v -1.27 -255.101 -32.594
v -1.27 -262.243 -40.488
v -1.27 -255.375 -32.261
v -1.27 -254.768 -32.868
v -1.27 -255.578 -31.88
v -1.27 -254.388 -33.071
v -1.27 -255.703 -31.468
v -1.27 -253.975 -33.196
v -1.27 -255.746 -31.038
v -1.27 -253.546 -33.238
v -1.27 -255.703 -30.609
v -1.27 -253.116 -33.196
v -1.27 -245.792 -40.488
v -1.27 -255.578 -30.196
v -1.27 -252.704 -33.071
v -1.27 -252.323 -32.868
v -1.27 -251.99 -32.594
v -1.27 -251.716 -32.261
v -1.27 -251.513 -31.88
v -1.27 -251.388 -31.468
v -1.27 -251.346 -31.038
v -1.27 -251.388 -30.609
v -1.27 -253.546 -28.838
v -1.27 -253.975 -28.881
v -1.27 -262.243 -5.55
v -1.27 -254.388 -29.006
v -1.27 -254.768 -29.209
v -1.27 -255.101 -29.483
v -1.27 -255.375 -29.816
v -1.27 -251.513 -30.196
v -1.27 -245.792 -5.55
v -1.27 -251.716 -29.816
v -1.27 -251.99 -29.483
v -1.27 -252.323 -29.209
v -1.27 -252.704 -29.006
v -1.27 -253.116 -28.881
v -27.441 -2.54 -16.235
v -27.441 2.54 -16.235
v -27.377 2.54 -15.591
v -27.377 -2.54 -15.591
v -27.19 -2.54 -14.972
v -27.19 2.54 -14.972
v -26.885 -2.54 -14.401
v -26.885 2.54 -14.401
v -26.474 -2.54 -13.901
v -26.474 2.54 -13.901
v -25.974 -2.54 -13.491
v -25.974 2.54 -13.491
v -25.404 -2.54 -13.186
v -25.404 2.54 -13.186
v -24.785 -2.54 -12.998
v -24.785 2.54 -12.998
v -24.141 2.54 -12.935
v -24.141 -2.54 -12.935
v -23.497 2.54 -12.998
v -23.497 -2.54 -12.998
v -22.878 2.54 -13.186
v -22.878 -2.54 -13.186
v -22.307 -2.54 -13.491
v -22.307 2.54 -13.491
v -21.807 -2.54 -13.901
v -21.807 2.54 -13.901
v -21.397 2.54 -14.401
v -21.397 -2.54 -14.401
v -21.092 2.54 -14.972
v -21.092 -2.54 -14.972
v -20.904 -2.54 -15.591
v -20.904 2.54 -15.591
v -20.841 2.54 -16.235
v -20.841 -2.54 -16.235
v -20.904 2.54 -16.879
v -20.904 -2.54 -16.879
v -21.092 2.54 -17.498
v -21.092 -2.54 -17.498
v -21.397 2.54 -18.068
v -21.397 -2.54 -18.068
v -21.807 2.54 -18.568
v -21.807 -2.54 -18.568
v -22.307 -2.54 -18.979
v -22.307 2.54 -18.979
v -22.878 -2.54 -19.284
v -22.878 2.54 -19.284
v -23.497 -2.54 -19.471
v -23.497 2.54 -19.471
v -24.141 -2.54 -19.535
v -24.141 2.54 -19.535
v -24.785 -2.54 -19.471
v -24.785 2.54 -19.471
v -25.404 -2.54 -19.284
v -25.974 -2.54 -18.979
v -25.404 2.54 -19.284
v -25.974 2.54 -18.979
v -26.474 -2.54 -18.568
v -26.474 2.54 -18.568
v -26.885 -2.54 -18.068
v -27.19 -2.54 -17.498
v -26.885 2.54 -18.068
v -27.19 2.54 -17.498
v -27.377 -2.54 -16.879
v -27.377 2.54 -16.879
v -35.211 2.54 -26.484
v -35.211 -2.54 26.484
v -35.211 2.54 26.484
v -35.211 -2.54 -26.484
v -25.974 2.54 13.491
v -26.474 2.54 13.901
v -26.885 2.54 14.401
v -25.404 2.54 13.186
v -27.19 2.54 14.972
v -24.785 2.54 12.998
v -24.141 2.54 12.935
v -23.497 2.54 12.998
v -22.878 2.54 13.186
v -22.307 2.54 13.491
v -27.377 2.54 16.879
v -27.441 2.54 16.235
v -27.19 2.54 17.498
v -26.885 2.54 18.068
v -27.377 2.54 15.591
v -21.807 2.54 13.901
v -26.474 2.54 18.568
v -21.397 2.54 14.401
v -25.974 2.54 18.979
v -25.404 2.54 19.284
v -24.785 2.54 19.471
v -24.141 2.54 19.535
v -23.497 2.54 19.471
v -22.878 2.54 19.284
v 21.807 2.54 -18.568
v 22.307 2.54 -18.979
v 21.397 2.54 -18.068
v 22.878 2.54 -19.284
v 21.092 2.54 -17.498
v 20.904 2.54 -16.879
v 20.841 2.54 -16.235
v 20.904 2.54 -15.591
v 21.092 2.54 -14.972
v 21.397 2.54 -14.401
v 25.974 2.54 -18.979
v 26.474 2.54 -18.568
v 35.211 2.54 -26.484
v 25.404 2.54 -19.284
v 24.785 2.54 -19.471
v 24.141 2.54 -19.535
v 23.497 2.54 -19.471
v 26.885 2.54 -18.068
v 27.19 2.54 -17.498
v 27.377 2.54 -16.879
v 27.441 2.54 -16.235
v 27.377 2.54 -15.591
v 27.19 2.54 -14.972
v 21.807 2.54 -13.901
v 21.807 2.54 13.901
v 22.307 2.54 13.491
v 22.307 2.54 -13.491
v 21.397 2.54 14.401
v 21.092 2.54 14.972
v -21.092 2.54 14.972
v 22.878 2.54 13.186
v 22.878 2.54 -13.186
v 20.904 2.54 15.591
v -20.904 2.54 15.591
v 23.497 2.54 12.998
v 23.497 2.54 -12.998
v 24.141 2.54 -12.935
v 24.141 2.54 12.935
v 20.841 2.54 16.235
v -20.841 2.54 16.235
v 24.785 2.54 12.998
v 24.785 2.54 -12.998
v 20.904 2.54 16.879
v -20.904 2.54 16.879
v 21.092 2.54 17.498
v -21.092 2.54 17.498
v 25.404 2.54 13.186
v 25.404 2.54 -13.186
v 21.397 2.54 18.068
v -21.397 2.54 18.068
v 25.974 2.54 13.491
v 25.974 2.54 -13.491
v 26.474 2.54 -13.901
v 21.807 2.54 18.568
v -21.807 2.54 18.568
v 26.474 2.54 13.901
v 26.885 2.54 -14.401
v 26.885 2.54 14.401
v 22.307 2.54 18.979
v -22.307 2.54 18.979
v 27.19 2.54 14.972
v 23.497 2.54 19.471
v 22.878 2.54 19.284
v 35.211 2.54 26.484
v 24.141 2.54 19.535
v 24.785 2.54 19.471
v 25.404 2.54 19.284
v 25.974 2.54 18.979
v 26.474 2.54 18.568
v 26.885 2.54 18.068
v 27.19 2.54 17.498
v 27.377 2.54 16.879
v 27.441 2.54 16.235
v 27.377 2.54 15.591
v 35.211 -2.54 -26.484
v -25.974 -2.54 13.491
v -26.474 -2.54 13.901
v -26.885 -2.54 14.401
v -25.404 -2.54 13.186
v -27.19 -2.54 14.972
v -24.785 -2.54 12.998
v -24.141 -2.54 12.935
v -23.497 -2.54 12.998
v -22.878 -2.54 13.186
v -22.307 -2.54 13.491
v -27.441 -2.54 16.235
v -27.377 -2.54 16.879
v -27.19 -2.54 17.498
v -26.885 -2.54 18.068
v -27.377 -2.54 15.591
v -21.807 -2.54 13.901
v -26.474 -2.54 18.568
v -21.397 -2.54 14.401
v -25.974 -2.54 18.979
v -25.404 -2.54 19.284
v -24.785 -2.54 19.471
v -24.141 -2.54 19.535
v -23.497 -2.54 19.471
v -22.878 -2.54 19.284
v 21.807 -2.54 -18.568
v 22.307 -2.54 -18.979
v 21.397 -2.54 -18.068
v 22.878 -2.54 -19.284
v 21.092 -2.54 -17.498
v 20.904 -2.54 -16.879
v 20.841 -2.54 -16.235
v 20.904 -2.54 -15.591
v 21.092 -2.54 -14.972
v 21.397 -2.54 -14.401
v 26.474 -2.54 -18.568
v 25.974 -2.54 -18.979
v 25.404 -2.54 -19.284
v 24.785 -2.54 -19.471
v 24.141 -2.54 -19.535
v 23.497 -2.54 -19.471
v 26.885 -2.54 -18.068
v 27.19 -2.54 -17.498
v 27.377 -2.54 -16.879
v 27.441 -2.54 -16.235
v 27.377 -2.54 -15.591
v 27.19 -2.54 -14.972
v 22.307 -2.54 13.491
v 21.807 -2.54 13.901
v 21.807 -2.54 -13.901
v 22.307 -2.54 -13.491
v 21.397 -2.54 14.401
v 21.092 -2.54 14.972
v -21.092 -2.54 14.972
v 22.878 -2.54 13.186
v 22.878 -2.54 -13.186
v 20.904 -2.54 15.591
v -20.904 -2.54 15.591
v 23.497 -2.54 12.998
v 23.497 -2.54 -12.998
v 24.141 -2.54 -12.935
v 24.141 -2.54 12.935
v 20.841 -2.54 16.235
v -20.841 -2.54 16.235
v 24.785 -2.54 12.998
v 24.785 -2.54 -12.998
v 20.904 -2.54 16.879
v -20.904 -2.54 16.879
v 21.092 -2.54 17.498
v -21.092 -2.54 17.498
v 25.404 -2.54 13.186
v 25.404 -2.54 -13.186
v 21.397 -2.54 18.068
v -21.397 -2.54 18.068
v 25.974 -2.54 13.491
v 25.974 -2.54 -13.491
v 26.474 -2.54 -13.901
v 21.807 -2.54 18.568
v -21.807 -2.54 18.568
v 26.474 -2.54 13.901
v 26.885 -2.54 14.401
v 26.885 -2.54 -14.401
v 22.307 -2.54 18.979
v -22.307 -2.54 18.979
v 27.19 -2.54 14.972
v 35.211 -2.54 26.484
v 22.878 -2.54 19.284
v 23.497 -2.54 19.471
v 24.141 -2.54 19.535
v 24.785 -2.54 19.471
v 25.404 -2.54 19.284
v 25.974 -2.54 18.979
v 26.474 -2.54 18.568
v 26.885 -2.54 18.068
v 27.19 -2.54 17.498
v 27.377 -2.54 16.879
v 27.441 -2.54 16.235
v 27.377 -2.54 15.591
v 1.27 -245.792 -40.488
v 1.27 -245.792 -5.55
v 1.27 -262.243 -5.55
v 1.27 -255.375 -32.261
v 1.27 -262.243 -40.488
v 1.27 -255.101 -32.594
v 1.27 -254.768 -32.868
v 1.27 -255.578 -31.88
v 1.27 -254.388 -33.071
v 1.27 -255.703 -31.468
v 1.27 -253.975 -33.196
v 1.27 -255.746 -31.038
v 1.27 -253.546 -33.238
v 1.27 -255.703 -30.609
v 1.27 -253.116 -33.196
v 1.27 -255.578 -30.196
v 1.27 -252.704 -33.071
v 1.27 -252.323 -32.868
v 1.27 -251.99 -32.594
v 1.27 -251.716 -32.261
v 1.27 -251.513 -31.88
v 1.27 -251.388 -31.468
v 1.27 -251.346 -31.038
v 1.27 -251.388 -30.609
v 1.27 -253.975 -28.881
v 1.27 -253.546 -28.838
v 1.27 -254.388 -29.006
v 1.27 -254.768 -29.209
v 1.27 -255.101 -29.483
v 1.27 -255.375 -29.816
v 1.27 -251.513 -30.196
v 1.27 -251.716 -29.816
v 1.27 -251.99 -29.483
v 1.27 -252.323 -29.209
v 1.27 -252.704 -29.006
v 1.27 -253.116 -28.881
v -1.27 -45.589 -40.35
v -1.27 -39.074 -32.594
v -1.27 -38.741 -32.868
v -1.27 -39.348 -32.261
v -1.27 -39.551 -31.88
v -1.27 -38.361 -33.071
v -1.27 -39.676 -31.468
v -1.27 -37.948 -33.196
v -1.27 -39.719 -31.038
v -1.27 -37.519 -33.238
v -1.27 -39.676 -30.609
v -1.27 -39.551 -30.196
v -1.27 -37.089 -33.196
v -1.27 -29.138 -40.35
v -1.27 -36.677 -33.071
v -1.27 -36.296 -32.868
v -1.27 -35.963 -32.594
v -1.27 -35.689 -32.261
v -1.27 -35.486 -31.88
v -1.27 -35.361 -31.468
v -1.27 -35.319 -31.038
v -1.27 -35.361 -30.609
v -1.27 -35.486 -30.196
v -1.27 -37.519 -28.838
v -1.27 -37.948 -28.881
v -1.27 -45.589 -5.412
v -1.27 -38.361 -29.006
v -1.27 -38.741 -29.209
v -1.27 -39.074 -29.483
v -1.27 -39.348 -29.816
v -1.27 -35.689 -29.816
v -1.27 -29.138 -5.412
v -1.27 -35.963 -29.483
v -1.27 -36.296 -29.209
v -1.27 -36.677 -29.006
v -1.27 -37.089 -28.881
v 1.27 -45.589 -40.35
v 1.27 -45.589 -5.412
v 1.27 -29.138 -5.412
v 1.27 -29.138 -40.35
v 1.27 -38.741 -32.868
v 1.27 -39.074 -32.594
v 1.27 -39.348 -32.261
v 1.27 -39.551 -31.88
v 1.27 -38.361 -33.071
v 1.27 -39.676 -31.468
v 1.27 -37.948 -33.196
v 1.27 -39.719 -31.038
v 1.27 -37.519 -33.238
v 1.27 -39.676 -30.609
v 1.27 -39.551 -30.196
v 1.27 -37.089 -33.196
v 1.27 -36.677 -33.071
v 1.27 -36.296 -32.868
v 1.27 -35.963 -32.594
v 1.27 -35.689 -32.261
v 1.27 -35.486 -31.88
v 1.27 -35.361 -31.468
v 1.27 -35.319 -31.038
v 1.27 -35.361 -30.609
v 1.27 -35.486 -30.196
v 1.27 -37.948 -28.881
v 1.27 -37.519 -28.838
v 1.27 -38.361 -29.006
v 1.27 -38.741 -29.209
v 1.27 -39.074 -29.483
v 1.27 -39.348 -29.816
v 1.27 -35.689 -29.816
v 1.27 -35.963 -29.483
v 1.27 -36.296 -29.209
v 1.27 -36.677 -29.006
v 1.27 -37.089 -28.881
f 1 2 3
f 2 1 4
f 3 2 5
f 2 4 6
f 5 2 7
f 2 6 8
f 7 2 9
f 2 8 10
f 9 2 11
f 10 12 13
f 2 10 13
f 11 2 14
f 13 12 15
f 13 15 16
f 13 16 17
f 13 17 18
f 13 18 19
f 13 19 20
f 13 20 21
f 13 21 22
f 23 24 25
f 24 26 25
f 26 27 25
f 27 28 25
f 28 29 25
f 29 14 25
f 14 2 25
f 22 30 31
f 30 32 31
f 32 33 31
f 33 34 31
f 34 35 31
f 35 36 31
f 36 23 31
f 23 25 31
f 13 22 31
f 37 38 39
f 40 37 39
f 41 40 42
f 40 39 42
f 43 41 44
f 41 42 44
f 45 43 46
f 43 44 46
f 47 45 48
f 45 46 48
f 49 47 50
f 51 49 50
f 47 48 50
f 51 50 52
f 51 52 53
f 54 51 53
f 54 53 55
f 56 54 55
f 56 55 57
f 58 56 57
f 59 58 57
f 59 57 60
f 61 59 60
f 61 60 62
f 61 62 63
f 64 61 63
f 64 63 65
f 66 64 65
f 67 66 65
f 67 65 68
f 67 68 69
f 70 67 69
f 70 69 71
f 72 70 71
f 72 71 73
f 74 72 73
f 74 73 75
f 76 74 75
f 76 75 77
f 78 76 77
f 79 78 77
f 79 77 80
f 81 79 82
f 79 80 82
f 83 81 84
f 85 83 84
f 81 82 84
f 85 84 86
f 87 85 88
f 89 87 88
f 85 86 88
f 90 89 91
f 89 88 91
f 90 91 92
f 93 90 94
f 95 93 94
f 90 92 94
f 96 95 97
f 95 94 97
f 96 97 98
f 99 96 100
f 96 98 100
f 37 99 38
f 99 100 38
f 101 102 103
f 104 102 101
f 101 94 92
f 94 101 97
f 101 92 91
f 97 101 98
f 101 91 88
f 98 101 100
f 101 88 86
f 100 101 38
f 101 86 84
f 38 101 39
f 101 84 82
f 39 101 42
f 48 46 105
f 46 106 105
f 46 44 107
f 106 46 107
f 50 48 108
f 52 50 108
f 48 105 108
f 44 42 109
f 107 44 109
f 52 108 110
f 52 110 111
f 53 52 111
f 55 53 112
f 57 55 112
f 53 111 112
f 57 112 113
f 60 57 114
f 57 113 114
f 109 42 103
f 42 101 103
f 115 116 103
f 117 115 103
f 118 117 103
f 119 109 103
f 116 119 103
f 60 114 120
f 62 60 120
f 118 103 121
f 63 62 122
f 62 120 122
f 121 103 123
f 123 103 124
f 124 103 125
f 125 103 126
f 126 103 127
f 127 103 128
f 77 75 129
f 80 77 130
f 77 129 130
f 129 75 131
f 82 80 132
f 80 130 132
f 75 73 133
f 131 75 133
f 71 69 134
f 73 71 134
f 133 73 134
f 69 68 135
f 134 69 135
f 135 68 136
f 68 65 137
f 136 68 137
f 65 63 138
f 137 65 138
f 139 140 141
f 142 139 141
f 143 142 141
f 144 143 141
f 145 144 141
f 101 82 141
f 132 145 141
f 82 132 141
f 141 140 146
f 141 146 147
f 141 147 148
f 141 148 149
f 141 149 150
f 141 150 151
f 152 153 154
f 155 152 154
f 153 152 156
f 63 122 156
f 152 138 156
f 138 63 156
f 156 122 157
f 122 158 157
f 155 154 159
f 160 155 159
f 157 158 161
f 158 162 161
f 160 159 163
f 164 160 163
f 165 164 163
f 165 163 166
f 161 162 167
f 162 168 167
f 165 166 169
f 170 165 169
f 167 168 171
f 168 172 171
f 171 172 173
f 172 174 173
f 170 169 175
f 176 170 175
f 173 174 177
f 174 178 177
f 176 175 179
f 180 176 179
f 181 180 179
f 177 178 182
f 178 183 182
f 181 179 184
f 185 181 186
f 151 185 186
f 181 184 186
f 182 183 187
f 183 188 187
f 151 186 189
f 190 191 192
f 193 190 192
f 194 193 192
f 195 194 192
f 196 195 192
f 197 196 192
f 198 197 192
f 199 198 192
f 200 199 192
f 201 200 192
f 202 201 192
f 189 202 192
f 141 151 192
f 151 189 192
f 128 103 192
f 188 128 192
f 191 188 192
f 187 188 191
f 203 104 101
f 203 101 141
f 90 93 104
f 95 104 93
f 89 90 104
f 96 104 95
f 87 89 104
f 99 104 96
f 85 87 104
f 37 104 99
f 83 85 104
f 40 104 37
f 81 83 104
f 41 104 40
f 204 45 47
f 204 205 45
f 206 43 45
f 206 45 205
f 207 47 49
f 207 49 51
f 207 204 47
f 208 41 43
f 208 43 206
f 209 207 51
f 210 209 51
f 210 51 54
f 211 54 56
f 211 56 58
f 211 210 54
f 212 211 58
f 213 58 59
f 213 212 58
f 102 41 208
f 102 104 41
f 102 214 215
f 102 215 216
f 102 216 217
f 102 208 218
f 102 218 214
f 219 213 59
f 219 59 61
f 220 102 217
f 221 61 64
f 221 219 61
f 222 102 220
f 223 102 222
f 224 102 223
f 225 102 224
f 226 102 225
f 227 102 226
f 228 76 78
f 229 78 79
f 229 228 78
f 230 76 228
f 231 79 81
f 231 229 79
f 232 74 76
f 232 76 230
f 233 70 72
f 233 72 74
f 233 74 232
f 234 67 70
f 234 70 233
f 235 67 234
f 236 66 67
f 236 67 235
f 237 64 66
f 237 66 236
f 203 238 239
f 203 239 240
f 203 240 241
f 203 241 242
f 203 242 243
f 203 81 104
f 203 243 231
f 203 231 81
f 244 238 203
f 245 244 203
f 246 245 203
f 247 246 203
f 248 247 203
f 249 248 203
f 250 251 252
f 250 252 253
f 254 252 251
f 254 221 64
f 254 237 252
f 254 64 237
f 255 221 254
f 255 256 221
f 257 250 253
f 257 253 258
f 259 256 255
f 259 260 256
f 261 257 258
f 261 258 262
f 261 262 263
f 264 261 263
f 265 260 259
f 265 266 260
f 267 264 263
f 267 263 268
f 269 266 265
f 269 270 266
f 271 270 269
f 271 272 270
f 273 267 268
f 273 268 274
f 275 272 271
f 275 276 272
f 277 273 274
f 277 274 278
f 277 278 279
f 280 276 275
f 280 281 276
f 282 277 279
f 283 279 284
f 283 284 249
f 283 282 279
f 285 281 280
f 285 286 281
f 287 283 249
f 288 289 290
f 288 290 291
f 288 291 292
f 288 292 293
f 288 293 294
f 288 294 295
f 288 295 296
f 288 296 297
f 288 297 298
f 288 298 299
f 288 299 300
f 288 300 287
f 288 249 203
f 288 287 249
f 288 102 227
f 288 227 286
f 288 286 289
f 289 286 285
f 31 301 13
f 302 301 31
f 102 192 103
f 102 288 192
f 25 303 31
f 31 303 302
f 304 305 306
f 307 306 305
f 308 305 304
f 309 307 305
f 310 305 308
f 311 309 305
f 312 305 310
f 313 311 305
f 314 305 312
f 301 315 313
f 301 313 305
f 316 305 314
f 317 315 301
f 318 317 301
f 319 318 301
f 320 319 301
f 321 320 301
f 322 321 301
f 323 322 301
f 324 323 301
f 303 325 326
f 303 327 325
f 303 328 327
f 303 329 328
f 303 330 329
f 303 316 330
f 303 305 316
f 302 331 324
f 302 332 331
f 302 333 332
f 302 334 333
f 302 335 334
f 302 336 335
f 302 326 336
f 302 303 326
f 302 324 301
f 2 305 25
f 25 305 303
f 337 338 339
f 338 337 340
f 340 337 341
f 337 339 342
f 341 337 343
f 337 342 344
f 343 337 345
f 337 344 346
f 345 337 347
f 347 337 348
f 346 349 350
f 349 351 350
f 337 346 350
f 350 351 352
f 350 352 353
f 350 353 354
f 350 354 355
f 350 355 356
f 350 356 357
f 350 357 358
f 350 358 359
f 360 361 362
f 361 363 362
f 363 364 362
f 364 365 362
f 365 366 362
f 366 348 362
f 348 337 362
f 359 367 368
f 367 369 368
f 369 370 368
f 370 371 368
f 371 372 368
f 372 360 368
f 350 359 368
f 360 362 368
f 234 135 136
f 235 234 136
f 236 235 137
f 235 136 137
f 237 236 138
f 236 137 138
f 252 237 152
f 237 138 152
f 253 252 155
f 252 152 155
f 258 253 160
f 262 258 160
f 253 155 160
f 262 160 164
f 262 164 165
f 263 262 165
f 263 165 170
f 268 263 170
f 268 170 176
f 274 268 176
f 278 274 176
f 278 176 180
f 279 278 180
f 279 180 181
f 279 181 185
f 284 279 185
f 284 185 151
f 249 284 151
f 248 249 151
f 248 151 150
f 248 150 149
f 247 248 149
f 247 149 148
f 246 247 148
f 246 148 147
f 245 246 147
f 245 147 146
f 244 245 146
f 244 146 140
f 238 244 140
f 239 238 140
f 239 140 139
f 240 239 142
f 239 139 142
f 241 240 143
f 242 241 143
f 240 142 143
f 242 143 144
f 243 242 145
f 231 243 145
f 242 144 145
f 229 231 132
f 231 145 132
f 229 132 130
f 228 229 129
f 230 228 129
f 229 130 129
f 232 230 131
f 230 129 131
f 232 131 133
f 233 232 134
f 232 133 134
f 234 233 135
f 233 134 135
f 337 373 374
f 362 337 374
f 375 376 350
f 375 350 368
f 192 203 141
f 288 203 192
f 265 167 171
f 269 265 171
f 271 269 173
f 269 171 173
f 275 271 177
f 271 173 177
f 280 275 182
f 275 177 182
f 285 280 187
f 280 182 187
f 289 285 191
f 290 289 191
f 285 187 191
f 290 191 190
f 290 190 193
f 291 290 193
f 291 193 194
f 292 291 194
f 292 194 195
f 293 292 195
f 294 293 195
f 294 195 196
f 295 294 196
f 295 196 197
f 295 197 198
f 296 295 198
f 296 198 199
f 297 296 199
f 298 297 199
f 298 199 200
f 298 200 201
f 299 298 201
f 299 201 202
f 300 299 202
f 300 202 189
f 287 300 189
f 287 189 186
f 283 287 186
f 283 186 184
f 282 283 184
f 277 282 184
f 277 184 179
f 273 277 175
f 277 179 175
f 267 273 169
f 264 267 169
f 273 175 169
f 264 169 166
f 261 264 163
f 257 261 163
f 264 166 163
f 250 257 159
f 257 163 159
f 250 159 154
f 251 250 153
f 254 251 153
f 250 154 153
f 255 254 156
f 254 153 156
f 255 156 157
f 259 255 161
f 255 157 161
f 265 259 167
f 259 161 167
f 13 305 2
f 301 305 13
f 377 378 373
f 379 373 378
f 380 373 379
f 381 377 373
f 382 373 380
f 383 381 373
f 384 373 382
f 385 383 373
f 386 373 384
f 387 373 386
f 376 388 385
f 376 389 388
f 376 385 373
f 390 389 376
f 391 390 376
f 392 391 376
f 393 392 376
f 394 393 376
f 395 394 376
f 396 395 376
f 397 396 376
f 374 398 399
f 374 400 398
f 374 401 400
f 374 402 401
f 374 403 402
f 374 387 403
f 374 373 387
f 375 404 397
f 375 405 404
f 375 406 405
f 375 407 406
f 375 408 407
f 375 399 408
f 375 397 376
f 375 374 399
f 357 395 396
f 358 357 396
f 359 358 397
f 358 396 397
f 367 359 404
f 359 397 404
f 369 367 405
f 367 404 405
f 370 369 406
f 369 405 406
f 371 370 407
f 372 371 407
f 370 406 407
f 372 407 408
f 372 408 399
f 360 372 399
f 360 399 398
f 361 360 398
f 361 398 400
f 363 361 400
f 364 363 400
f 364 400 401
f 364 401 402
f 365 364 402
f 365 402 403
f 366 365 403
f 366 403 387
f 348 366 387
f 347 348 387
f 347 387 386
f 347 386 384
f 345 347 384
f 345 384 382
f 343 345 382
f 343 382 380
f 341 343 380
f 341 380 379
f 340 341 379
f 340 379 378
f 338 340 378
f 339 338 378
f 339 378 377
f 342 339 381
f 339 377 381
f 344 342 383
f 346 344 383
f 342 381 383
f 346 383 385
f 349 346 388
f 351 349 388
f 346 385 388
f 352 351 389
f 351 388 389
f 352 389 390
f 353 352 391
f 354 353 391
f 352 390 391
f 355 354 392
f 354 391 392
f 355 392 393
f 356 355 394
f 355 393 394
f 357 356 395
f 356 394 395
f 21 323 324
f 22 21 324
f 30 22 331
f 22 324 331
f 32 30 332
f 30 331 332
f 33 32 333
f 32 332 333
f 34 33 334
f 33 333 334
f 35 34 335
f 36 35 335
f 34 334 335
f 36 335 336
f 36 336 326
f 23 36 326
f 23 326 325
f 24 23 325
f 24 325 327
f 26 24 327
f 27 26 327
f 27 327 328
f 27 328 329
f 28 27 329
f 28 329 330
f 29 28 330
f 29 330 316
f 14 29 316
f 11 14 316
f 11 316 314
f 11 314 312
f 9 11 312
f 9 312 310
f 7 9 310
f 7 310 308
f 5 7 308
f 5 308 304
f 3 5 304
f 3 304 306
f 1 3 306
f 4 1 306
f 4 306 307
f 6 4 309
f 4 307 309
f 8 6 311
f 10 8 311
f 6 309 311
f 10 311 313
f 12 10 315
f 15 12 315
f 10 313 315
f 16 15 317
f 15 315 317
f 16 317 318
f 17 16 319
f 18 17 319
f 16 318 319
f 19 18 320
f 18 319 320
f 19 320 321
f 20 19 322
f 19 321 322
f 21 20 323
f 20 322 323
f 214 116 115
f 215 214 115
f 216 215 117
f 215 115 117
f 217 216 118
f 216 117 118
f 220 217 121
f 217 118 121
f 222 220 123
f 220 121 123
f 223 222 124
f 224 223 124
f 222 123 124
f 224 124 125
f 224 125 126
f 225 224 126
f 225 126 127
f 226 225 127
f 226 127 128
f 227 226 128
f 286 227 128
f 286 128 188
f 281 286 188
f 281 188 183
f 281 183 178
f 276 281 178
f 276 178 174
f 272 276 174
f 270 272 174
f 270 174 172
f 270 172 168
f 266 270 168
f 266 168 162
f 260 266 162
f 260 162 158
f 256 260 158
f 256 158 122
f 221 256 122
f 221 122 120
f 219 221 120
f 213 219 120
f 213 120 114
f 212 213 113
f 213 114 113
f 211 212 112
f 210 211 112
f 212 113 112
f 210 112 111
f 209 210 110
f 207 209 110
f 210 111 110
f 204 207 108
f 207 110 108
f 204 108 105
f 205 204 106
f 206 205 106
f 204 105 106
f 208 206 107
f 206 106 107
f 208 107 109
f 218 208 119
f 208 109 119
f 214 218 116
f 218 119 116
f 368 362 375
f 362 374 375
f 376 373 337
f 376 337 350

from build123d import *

# Parameters (mm, degrees)
F1_DEPTH  = 2.54
F3_D      = 6.6
F7_W      = 16.4503324777
F7_H      = 34.9378818646
F8_DEPTH  = 1.27
F10_D     = 4.4
F11_W     = 16.4503324777
F11_H     = 34.9378818646
F12_DEPTH = 1.27
F14_D     = 4.4


# Not quite as in the source:
# - the program builds the solid bodies; features that only make, move or delete a surface that nothing else refers to are left out


with BuildPart() as f1:
    # F0 (on Front) → F1 (new body, symmetric)
    with BuildSketch(Plane.XZ):
        Polygon((-25.0618057636, 18.8499050002), (-35.2113864935, 26.4837776091), (-35.2113864935, -26.4837776091), (0, 0), align=None)
        Polygon((35.2113864935, 26.4837776091), (-35.2113864935, 26.4837776091), (-25.0618057636, 18.8499050002), (0, 0), align=None)
        Polygon((35.2113864935, -26.4837776091), (35.2113864935, 26.4837776091), (0, 0), align=None)
        Polygon((0, 0), (-35.2113864935, -26.4837776091), (35.2113864935, -26.4837776091), align=None)
    extrude(amount=F1_DEPTH, both=True)

    # F3 (through all)
    with Locations(Plane.XZ.offset(2.54)):
        with Locations((-24.1408664733, 16.2348244339), (24.1408664733, 16.2348244339), (24.1408664733, -16.2348244339), (-24.1408664733, -16.2348244339)):
            Hole(F3_D / 2)


with BuildPart() as f8:
    # F7 (on Right) → F8 (new body, symmetric)
    with BuildSketch(Plane.YZ):
        with Locations((-37.3634537682, -22.8809299879)):
            Rectangle(F7_W, F7_H)
    extrude(amount=F8_DEPTH, both=True)

    # F10 (through all)
    with Locations(Plane(origin=(-1.27, 0, 0), x_dir=(0, -1, 0), z_dir=(-1, 0, 0))):
        with Locations((37.5186465681, -31.0383625329)):
            Hole(F10_D / 2)


with BuildPart() as f12:
    # F11 (on Right) → F12 (new body, symmetric)
    with BuildSketch(Plane.YZ):
        with Locations((-254.0175085887, -23.0186316185)):
            Rectangle(F11_W, F11_H)
    extrude(amount=F12_DEPTH, both=True)

    # F14 (through all)
    with Locations(Plane(origin=(-1.27, 0, 0), x_dir=(0, -1, 0), z_dir=(-1, 0, 0))):
        with Locations((253.5456418991, -31.0383625329)):
            Hole(F14_D / 2)


solid = Compound([f1.part, f8.part, f12.part])
